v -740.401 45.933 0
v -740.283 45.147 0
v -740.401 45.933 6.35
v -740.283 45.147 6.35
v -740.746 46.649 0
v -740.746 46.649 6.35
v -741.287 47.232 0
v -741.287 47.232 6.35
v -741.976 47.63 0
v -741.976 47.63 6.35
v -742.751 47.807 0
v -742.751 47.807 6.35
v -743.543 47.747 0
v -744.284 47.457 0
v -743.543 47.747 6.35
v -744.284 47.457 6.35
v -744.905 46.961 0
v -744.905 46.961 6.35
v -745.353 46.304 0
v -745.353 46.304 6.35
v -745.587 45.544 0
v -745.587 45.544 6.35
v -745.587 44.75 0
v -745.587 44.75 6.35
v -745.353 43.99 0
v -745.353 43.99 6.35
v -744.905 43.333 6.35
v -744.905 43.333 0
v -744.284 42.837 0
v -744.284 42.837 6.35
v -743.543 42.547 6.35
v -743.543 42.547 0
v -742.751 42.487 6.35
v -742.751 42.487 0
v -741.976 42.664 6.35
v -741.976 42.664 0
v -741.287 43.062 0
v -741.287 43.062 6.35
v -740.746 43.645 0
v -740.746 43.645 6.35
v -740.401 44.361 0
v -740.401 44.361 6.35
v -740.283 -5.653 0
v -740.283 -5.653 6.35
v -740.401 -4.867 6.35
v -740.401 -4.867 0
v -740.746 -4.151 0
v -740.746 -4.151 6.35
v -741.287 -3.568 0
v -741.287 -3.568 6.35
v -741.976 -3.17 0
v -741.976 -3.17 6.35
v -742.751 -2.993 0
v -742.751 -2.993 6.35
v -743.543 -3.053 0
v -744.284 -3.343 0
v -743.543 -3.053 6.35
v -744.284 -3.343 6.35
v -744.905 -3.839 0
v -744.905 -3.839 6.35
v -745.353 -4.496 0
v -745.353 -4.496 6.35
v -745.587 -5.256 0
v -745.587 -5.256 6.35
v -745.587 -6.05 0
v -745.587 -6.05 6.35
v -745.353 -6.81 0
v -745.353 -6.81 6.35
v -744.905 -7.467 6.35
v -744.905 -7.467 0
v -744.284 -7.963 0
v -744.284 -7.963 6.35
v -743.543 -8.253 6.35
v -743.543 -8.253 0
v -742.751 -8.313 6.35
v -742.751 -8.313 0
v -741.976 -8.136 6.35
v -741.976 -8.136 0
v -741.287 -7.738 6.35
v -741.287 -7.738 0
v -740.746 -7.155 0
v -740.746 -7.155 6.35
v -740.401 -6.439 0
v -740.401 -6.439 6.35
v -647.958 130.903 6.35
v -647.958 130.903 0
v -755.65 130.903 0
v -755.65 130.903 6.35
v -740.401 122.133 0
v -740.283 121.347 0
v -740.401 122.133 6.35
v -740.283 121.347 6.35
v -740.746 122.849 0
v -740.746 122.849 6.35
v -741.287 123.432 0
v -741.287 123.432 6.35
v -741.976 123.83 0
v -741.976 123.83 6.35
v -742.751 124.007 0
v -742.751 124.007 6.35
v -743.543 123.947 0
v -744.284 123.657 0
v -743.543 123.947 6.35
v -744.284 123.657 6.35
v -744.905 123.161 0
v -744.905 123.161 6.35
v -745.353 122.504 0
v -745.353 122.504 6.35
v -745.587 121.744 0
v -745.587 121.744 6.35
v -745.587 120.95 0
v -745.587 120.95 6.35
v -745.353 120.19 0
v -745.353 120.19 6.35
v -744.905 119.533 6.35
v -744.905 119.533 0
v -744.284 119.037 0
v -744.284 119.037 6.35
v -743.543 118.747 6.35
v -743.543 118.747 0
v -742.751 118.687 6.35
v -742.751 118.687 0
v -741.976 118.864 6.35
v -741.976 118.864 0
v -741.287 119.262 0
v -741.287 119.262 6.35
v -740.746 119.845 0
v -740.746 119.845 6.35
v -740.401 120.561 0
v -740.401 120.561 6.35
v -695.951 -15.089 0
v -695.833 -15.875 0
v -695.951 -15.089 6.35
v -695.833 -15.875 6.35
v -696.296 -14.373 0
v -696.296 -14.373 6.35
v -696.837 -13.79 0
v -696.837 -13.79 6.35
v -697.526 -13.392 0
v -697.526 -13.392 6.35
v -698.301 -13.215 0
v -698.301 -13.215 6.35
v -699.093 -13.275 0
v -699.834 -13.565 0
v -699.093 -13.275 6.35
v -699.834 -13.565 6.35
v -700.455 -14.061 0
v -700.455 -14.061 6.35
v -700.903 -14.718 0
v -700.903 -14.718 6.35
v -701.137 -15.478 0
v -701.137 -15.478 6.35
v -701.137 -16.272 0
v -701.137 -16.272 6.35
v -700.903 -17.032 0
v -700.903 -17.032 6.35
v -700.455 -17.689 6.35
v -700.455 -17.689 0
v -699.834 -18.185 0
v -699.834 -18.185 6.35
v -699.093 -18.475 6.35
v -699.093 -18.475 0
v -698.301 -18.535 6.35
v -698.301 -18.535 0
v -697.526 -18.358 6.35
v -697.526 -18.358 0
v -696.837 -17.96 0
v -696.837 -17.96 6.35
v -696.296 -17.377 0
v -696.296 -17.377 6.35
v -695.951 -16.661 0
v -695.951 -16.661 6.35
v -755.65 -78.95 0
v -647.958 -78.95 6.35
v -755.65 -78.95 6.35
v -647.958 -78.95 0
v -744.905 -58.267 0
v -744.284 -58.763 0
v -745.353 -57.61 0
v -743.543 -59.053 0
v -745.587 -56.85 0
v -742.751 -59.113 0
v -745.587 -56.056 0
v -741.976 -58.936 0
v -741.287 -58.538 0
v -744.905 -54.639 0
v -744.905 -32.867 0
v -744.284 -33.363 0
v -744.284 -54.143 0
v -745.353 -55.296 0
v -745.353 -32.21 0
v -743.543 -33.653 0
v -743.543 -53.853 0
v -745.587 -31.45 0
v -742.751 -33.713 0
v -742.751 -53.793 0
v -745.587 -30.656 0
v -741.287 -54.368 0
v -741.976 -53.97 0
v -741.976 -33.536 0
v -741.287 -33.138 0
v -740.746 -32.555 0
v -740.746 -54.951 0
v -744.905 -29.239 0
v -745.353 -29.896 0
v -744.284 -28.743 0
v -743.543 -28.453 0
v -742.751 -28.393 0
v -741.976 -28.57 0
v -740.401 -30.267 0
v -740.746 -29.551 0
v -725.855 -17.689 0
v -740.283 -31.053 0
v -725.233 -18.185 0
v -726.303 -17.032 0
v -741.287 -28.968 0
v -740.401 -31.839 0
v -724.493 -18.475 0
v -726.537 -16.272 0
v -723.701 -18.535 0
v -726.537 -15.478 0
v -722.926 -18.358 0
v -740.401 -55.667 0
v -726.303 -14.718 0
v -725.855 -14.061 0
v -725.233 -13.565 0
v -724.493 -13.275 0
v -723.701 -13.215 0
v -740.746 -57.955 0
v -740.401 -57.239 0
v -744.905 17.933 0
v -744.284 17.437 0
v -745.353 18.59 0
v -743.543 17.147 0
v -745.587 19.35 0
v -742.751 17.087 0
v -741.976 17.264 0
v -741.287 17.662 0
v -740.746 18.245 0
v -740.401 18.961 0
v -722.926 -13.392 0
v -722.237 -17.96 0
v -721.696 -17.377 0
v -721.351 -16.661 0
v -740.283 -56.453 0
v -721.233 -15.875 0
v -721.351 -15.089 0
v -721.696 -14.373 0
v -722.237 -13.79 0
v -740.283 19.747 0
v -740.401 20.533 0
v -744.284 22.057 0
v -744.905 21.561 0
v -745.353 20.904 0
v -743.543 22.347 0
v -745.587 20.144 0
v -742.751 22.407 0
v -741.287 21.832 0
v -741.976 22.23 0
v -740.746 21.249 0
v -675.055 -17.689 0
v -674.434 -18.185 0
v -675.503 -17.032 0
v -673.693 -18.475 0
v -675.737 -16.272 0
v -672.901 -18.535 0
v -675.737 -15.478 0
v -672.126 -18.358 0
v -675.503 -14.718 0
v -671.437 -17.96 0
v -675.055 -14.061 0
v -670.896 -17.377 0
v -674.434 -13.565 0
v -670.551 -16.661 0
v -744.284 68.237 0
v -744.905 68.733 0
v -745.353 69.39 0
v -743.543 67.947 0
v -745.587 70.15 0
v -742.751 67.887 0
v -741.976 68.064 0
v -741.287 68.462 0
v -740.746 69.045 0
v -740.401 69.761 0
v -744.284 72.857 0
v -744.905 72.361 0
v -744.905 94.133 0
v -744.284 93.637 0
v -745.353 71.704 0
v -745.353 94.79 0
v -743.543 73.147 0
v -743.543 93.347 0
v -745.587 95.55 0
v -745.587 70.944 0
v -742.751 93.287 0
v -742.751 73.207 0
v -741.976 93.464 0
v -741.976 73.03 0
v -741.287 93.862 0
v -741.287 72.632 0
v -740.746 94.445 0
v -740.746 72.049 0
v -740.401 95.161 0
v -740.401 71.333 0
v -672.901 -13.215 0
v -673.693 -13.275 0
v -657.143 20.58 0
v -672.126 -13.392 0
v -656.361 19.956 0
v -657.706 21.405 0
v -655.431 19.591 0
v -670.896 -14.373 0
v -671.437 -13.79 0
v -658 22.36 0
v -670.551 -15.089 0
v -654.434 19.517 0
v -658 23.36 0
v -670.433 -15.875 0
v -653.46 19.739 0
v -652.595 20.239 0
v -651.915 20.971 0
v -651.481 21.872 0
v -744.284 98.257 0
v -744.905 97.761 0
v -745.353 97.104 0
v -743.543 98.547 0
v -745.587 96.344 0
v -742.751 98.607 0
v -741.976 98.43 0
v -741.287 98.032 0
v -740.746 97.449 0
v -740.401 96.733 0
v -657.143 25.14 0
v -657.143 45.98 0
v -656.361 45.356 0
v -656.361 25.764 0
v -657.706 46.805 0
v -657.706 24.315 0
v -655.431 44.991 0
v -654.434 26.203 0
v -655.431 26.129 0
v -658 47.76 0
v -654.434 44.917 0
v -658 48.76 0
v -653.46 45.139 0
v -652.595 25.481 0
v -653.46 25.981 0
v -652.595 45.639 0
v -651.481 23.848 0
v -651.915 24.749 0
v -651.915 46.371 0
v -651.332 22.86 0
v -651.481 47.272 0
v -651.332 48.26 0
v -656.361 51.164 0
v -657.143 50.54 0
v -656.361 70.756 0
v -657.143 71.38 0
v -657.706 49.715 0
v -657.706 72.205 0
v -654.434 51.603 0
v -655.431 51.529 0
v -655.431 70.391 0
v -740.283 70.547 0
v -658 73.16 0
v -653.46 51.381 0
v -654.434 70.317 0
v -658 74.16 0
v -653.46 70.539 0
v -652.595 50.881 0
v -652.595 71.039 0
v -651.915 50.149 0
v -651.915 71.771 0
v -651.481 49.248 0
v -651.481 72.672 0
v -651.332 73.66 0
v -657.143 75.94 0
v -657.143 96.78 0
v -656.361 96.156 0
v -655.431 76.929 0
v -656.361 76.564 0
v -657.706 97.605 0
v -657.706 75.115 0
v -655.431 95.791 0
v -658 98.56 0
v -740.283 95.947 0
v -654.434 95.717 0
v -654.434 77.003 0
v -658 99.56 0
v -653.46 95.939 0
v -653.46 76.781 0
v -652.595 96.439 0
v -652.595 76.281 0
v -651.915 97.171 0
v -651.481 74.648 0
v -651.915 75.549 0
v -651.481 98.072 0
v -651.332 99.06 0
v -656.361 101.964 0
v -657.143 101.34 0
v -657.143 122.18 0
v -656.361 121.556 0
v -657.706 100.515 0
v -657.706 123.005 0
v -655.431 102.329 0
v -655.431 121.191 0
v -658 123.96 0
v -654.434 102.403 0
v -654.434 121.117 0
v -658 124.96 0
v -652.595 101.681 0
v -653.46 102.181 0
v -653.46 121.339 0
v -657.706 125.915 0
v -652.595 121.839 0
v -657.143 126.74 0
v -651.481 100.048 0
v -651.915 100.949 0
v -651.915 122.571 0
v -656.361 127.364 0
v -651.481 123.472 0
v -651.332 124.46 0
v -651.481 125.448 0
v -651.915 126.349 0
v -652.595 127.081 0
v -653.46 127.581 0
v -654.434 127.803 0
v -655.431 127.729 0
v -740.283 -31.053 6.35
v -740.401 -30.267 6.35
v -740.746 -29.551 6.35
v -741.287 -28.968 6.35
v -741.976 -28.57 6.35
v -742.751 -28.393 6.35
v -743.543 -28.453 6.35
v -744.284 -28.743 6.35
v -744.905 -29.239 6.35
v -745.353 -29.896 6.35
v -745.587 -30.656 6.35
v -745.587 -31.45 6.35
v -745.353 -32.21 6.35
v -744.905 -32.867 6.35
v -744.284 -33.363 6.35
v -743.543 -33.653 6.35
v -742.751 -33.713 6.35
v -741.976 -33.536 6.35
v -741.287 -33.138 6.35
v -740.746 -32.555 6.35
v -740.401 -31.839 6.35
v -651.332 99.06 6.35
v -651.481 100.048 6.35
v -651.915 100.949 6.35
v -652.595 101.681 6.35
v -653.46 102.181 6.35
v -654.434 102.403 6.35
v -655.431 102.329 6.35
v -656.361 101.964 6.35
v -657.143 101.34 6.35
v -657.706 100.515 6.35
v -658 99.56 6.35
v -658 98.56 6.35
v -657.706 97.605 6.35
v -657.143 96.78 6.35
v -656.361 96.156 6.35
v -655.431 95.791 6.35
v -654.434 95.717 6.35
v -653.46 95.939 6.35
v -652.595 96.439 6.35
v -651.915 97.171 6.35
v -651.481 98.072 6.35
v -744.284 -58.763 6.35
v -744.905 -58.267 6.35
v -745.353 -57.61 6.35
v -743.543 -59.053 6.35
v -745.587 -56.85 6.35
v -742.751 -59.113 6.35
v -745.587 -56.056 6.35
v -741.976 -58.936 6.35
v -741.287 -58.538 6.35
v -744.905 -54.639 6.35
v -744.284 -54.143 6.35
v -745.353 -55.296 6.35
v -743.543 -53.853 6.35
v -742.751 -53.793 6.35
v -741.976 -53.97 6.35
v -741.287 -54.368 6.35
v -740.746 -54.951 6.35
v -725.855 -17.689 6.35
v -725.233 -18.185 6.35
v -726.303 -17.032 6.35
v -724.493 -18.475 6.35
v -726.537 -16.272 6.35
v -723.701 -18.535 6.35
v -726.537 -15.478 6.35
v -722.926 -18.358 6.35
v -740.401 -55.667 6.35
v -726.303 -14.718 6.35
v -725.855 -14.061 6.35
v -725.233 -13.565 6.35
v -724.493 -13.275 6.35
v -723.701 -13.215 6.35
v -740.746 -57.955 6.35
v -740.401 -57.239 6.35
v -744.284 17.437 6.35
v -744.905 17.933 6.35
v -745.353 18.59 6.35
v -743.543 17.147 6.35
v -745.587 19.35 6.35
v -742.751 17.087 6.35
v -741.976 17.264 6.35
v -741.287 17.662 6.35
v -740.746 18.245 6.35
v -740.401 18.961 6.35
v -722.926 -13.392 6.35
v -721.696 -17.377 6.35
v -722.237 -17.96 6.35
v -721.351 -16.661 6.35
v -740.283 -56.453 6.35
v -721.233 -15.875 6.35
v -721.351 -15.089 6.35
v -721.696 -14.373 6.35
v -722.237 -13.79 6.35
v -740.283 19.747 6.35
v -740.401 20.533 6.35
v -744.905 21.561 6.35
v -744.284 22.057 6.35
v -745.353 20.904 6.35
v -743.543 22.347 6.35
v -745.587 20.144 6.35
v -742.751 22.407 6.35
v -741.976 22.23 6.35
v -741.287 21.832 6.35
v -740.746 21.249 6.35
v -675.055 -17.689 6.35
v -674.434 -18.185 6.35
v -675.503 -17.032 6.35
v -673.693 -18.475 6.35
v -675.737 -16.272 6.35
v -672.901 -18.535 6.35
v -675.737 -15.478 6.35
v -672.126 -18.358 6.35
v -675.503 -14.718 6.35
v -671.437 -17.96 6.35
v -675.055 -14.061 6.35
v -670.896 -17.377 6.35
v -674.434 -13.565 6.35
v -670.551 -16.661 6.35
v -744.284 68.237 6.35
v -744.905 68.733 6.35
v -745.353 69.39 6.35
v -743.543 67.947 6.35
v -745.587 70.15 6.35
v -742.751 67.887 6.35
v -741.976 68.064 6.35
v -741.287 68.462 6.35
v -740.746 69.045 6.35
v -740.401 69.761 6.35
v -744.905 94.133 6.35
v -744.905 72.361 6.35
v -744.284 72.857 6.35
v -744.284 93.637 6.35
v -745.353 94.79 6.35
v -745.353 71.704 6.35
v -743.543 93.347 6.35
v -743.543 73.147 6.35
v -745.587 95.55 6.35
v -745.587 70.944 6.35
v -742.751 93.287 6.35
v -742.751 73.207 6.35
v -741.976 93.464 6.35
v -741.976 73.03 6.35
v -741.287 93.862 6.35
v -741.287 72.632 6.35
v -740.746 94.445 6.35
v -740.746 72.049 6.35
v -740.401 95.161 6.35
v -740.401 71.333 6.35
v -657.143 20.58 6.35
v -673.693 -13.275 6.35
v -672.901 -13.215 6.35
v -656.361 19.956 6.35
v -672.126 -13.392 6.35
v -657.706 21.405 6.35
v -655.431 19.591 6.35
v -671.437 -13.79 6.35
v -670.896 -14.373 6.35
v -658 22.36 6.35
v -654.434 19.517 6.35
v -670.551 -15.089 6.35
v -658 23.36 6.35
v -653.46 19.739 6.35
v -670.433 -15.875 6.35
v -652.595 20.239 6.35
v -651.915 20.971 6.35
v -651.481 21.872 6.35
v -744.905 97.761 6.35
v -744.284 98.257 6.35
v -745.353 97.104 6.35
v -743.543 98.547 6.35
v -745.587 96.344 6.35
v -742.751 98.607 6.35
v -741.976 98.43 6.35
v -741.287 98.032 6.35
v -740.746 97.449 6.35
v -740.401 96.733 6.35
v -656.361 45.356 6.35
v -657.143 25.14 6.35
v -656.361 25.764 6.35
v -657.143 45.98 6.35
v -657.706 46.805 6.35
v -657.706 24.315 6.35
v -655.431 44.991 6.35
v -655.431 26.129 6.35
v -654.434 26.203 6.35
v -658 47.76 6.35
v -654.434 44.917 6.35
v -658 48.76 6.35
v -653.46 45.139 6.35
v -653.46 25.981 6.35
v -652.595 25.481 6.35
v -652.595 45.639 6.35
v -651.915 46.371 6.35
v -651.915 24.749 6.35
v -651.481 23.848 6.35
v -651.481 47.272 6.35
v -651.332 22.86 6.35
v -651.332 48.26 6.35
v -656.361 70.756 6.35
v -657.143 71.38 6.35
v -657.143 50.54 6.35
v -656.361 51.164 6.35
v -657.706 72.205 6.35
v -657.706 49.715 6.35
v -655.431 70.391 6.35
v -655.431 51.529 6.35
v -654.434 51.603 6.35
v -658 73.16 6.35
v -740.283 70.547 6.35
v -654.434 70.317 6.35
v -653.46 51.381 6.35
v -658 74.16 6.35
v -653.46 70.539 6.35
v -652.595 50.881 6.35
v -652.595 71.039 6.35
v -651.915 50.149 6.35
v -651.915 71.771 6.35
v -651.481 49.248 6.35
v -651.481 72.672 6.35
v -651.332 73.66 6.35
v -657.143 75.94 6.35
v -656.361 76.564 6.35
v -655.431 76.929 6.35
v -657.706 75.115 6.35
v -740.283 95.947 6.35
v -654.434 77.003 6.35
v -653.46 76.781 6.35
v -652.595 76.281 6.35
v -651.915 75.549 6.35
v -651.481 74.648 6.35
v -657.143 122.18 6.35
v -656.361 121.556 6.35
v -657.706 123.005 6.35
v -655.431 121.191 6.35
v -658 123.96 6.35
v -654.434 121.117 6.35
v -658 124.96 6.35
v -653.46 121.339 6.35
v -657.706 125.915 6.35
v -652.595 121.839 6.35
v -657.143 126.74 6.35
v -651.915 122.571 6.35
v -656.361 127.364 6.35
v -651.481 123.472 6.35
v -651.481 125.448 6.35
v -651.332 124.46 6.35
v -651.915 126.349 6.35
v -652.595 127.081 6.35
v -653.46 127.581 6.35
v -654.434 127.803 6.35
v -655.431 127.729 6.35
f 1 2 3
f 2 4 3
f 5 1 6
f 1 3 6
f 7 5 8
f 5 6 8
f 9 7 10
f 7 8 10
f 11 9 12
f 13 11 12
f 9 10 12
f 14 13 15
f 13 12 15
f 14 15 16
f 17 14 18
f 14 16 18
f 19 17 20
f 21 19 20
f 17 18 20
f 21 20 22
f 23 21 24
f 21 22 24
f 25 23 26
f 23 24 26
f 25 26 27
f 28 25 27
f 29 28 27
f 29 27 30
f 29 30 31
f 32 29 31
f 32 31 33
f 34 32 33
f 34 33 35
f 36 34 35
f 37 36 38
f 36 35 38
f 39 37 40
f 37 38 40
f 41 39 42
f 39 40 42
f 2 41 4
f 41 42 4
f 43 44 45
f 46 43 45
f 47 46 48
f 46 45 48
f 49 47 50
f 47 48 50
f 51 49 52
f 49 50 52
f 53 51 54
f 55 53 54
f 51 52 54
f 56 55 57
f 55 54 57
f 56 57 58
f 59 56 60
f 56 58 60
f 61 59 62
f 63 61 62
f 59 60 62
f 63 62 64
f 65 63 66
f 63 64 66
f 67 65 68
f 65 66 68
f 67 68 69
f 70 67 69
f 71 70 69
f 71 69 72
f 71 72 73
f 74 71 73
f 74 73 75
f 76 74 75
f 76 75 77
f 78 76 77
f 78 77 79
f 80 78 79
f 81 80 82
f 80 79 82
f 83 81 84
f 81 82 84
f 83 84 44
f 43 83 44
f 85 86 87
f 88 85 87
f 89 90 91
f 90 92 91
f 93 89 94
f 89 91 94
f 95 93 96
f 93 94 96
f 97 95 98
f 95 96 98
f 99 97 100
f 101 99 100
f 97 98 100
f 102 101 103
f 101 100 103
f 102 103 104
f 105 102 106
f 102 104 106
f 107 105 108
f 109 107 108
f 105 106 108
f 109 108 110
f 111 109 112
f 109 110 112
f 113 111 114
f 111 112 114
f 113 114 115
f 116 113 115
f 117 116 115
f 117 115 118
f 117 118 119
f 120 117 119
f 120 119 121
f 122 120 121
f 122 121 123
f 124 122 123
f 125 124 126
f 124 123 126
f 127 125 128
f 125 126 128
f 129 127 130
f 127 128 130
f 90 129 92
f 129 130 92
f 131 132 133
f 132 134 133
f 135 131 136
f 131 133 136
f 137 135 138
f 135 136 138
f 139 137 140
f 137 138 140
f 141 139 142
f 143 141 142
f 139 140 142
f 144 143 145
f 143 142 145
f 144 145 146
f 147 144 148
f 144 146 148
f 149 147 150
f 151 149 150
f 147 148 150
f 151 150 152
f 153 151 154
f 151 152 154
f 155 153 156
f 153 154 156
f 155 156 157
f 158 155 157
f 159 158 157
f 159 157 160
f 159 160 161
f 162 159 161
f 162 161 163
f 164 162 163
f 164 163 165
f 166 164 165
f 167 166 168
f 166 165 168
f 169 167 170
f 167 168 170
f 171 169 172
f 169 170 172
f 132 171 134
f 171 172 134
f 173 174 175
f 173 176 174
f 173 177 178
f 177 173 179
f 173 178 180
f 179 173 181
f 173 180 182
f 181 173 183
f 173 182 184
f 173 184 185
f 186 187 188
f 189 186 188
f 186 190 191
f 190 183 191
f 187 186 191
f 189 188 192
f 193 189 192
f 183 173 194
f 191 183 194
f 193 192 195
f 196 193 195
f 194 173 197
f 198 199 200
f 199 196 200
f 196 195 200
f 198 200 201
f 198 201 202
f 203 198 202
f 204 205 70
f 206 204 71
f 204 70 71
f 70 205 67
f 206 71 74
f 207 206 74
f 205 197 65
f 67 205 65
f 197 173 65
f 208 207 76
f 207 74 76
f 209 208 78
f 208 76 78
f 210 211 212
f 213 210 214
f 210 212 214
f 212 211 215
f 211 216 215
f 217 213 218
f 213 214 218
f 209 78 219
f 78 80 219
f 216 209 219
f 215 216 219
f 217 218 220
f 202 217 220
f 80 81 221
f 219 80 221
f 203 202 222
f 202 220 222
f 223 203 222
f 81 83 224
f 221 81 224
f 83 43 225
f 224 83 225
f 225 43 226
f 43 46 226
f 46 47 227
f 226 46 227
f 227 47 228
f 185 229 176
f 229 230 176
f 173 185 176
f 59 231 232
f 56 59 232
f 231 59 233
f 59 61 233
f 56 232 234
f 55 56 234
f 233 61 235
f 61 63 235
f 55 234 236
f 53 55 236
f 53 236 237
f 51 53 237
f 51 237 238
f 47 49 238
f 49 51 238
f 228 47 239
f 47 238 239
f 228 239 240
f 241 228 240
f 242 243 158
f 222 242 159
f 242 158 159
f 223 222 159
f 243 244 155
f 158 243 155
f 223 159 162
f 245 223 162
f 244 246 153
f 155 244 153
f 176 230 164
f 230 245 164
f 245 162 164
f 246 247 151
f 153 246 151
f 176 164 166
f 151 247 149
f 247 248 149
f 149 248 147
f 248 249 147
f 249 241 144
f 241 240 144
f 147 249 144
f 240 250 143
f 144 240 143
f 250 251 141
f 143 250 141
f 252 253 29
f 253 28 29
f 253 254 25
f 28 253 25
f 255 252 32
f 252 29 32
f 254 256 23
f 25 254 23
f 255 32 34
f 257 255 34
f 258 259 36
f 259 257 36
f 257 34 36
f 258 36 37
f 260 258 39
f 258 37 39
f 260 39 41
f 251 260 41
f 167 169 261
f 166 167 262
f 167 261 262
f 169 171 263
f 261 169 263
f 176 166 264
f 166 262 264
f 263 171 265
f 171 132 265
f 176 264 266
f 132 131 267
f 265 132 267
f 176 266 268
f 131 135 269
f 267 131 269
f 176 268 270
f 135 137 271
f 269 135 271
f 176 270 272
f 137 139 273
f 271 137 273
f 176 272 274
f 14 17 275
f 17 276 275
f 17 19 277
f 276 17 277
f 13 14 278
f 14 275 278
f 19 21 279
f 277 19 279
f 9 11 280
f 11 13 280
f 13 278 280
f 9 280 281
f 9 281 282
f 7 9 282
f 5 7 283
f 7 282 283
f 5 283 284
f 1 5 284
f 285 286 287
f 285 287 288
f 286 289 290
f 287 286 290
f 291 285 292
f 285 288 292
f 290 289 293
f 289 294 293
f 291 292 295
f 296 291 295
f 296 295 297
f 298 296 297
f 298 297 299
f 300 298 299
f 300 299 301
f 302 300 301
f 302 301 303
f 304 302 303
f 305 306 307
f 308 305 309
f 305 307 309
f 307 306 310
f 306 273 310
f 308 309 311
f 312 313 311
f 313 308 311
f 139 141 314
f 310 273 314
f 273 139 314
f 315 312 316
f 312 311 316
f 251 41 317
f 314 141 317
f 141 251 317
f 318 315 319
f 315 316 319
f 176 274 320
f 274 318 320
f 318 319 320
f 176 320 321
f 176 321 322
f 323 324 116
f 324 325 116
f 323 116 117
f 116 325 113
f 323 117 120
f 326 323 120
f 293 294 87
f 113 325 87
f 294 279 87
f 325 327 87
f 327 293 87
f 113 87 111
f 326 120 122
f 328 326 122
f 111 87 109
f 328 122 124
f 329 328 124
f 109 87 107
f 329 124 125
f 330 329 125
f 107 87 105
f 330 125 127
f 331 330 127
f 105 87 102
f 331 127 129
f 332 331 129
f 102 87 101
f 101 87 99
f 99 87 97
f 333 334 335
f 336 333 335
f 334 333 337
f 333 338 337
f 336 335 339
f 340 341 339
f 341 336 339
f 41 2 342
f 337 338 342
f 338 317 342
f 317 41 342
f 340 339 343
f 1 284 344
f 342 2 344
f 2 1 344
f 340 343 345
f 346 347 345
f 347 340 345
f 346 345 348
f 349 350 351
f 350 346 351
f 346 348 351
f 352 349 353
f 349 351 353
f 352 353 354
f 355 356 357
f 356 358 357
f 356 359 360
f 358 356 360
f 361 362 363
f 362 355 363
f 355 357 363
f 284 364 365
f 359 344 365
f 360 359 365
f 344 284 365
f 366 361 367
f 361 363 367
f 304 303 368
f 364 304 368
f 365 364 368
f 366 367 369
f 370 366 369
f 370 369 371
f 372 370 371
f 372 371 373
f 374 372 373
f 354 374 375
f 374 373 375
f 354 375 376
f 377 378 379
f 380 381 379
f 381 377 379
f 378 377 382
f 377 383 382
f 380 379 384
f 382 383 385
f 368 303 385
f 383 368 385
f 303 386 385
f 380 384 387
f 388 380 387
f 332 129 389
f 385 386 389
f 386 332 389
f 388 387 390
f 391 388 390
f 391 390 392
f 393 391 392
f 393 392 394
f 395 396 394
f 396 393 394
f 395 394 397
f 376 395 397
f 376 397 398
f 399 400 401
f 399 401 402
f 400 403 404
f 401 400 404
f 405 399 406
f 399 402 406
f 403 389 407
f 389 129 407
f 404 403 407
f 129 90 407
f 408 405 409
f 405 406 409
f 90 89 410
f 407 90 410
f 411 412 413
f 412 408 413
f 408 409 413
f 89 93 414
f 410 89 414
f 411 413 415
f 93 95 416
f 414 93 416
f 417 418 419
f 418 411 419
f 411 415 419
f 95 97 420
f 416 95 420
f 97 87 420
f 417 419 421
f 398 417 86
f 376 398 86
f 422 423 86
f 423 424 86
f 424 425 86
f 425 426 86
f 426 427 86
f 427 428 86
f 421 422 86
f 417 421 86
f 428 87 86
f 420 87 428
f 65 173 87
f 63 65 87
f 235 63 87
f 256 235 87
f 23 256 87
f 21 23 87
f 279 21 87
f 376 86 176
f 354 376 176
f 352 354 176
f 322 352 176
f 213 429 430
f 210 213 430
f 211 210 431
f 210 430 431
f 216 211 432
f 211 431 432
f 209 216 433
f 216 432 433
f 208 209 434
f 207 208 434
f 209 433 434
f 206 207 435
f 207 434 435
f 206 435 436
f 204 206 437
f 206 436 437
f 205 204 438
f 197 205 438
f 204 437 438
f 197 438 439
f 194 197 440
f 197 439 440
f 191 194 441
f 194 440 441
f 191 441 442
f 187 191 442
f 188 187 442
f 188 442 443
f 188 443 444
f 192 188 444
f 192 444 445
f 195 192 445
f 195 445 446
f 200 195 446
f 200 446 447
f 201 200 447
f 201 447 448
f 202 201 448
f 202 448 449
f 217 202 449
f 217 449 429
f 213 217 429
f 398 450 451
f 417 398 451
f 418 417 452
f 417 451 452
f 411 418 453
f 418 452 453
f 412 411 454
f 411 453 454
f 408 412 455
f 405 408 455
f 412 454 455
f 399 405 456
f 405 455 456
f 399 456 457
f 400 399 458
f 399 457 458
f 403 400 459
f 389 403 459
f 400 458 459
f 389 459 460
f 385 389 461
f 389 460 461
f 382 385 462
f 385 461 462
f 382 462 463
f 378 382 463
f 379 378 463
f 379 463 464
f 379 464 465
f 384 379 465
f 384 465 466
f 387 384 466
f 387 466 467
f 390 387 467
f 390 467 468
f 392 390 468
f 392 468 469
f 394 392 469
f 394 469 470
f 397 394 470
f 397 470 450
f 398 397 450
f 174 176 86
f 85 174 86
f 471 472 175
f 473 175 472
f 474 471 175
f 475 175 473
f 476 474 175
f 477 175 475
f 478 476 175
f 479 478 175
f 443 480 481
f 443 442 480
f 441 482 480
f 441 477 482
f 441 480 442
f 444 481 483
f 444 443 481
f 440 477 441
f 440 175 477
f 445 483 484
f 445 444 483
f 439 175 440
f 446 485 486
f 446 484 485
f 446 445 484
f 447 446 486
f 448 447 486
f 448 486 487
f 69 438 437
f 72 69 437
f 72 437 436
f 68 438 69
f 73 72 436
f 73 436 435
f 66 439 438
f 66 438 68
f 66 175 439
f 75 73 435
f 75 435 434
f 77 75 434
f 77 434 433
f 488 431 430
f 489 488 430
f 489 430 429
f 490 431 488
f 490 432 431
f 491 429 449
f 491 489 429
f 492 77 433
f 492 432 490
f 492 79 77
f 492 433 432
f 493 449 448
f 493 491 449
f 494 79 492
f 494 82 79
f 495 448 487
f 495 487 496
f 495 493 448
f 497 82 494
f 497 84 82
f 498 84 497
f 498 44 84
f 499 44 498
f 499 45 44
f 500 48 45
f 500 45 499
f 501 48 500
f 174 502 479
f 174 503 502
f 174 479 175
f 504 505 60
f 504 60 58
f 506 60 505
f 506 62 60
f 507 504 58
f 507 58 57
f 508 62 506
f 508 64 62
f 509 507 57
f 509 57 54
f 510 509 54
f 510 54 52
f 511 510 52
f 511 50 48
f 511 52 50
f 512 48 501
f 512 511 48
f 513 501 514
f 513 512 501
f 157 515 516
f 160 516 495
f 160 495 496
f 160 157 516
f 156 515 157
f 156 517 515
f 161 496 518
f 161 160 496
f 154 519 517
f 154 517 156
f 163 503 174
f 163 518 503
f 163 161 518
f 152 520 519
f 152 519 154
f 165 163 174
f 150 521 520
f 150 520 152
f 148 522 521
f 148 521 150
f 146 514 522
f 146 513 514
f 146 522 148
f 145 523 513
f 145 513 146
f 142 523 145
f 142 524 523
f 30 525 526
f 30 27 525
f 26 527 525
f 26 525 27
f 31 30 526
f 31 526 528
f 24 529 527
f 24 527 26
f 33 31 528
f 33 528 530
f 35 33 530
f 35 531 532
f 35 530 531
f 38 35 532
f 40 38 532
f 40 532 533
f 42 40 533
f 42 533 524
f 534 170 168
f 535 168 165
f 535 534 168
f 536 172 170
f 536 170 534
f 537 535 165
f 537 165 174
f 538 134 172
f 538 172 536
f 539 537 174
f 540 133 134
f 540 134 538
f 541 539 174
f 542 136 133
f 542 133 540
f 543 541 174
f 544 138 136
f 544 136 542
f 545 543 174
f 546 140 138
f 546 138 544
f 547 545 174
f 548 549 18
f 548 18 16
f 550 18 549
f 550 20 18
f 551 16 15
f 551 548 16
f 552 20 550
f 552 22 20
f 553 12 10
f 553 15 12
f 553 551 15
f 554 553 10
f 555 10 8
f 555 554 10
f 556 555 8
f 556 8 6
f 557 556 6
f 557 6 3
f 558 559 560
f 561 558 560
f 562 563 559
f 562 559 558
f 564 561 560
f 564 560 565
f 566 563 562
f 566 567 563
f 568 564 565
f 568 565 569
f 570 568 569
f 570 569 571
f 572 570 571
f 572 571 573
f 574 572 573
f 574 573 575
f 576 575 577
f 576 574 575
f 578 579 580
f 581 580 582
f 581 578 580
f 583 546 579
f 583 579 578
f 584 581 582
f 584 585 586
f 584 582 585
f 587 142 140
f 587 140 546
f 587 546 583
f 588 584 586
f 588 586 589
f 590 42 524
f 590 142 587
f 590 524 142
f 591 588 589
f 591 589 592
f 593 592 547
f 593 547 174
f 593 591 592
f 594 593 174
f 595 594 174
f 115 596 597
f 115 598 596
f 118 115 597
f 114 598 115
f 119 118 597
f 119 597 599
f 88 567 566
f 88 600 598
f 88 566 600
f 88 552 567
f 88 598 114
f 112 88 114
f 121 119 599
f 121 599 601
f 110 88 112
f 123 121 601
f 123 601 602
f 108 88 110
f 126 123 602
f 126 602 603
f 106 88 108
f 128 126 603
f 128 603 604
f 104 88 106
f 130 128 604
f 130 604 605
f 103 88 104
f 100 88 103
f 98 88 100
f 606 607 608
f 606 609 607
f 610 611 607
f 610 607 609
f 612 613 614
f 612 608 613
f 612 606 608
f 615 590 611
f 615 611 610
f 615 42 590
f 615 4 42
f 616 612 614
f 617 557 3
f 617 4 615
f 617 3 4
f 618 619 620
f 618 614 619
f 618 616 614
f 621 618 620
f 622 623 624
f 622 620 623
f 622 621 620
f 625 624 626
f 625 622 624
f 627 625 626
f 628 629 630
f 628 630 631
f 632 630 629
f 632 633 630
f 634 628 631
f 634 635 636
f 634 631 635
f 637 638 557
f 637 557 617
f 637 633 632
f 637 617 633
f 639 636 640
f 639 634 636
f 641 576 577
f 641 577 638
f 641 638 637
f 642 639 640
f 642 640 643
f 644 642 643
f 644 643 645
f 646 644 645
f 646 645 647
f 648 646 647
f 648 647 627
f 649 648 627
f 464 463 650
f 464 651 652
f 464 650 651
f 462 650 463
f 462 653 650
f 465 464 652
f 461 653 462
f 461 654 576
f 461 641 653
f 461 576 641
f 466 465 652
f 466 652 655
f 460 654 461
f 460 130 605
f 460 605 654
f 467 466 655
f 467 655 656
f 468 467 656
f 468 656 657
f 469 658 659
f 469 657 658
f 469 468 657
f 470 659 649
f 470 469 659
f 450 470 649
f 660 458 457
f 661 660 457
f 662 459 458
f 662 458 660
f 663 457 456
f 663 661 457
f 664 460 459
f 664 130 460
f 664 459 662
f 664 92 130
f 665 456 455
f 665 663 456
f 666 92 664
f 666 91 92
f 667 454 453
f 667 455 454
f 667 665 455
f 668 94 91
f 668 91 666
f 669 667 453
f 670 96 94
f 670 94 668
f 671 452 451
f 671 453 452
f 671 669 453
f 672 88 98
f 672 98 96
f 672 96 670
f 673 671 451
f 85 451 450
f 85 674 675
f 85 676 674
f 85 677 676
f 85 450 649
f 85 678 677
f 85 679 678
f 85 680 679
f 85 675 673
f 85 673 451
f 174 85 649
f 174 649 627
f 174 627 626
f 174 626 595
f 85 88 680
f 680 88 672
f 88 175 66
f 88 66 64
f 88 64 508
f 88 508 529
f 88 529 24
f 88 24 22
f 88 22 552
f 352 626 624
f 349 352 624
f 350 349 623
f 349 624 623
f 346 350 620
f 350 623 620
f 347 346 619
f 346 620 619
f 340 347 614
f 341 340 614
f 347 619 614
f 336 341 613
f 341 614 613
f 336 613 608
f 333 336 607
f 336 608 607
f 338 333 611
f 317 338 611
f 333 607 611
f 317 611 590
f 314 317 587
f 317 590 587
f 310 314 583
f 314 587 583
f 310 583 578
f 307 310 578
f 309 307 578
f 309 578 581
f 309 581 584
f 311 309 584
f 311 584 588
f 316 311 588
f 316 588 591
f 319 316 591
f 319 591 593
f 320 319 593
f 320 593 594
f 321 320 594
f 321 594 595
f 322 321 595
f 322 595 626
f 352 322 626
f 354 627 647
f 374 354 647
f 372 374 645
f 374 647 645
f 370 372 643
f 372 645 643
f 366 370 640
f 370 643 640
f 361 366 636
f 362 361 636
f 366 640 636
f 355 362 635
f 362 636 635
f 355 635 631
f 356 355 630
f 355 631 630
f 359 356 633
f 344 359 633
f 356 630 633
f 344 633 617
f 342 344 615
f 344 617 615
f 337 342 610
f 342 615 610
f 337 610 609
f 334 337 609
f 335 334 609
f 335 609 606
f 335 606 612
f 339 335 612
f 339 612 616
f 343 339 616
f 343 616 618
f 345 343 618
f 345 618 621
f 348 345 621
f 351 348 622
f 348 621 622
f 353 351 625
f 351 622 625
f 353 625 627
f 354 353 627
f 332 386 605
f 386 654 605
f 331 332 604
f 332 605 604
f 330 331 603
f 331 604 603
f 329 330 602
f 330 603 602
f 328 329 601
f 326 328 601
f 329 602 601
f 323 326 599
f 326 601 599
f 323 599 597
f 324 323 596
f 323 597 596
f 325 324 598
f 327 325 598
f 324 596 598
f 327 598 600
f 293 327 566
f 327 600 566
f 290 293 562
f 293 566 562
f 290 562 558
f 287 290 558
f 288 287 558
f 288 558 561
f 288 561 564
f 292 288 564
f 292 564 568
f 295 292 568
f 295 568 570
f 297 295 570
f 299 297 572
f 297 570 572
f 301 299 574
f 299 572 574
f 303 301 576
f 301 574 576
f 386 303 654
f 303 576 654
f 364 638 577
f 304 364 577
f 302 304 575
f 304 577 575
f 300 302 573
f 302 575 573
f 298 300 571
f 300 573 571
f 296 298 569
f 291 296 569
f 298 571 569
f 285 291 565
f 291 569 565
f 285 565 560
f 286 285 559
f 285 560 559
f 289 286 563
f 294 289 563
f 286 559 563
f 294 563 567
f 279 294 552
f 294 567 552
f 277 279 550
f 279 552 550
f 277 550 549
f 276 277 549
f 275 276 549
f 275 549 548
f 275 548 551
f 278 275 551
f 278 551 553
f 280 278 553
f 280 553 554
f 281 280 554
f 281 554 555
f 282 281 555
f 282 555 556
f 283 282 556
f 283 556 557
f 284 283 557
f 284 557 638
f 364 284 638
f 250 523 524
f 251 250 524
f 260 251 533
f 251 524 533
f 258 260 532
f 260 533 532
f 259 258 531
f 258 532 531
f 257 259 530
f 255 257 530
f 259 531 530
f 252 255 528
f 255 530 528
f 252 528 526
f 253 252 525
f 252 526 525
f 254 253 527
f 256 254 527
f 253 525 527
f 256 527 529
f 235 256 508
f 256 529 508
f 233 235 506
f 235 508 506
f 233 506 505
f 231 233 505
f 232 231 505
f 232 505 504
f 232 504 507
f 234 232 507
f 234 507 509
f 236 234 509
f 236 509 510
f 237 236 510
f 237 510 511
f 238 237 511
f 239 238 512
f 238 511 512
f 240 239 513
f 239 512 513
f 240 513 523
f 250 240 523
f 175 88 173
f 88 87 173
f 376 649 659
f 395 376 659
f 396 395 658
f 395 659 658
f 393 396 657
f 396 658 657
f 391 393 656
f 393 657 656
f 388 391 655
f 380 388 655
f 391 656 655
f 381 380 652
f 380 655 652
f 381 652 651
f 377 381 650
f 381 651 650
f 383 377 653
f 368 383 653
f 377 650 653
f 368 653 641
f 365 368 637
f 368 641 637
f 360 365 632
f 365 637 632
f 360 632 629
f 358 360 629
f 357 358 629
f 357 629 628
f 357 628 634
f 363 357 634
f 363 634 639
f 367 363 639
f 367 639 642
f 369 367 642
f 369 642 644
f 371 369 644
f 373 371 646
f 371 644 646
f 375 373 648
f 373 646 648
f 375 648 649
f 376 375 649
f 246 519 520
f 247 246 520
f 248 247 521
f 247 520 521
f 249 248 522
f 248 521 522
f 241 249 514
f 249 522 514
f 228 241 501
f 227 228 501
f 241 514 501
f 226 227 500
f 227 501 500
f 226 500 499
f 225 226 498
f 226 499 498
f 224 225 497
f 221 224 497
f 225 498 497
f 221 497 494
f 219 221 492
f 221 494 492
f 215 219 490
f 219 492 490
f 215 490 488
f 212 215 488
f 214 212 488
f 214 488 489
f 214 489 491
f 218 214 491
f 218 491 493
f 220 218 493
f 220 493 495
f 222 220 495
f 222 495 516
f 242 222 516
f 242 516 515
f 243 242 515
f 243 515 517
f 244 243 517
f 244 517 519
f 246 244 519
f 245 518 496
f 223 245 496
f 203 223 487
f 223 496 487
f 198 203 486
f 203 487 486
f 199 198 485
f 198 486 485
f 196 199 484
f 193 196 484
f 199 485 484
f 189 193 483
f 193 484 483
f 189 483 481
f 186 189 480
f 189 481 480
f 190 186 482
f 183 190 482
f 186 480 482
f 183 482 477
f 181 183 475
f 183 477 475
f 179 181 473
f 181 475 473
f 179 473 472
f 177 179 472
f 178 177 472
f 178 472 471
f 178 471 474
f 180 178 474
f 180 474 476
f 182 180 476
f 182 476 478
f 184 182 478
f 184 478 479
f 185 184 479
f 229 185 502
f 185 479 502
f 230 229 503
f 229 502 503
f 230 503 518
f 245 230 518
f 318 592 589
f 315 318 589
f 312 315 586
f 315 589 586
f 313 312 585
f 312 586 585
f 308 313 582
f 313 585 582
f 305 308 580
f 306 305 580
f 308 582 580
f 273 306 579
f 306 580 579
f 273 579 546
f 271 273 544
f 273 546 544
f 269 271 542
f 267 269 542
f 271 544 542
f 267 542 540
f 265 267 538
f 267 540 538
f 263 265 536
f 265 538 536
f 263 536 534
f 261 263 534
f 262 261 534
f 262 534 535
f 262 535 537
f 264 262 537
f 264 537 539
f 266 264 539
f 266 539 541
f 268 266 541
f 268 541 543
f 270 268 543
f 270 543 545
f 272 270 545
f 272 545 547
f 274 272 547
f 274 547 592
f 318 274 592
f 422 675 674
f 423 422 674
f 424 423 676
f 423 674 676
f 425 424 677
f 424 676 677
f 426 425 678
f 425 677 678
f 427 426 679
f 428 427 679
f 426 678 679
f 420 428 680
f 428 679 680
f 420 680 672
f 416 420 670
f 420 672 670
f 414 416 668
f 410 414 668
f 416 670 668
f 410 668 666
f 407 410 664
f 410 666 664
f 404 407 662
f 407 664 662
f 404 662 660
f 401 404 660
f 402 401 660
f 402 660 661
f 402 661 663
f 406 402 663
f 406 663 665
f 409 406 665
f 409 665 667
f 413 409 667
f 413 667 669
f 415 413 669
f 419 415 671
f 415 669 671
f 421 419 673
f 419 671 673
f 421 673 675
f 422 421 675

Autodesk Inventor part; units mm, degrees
ref_plane "YZ Plane" through (0, 0, 0) normal (1, 0, 0) x (0, 1, 0)
ref_plane "XZ Plane" through (0, 0, 0) normal (0, 1, 0) x (-1, 0, 0)
ref_plane "XY Plane" through (0, 0, 0) normal (0, 0, 1) x (1, 0, 0)
ref_plane "Work Plane3" through (0, 0, 0) normal (0, 0, 1) x (1, 0, 0)
sketch "Sketch1" plane through (0, 0, 0) normal (0, 0, 1) x (1, 0, 0)
  line L0 (-755.65, -71.0123) -> (-755.65, -75.0128) projected
  line L1 (-57.15, -75.0128) -> (-755.65, -75.0128) projected
  line L2 (-57.15, -75.0128) -> (-57.15, -71.0123) projected
  line L3 (-57.15, -71.0123) -> (-755.65, -71.0123) projected
  line L4 (-57.15, -78.9498) -> (-755.65, -78.9498) projected
  line L5 (-755.65, -78.9498) -> (-647.9579, -78.9498)
  line L6 (-647.9579, -78.9498) -> (-647.9579, 130.9029)
  line L7 (-647.9579, 130.9029) -> (-755.65, 130.9029)
  line L8 (-755.65, 130.9029) -> (-755.65, -78.9498)
  point P0 (0, 0)
extrude "Extrusion1" add sketch "Sketch1" along normal blind 6.35 contours L3 L6 L1 L0 | L8 L7 L6 L3 | L1 L6 L4 L8
sketch "Sketch3" plane through (0, 0, 6.35) normal (0, 0, 1) x (1, 0, 0)
  point P0 (0, 0)
sketch "Sketch4" plane through (0, 0, 6.35) normal (0, 0, 1) x (1, 0, 0)
  circle A0 centre (-654.685, 22.86) radius 3.3528 projected
  circle A1 centre (-654.685, 48.26) radius 3.3528 projected
  circle A2 centre (-654.685, 73.66) radius 3.3528 projected
  circle A3 centre (-654.685, 99.06) radius 3.3528 projected
  circle A4 centre (-654.685, 124.46) radius 3.3528 projected
  line L0 (-663.448, 15.875) -> (-648.335, 15.875) construction
  line L1 (-648.335, 133.985) -> (-648.335, 15.875) construction
  line L2 (-648.335, 133.985) -> (-651.51, 137.16) construction
  line L3 (-663.448, 137.16) -> (-651.51, 137.16) construction
  line L4 (-663.448, 137.16) -> (-663.448, 15.875) construction
  line L5 (-663.448, 137.16) -> (-663.448, 15.875) projected
  point P0 (0, 0)
extrude "Extrusion2" cut sketch "Sketch4" against normal blind 6.35
sketch "Sketch5" plane through (0, 0, 6.35) normal (0, 0, 1) x (1, 0, 0)
  line L0 (-736.6, -3.937) -> (-736.6, -22.225) projected
  line L1 (-460.375, -22.225) -> (-736.6, -22.225) projected
  line L2 (-460.375, -22.225) -> (-457.2, -19.05) projected
  line L3 (-457.2, -3.937) -> (-457.2, -19.05) projected
  line L4 (-736.6, -3.937) -> (-457.2, -3.937) projected
  circle A0 centre (-469.9, -15.875) radius 2.667 projected
  circle A1 centre (-495.3, -15.875) radius 2.667 projected
  circle A2 centre (-520.7, -15.875) radius 2.667 projected
  circle A3 centre (-546.1, -15.875) radius 2.667 projected
  circle A4 centre (-571.5, -15.875) radius 2.667 projected
  circle A5 centre (-596.9, -15.875) radius 2.667 projected
  circle A6 centre (-622.3, -15.875) radius 2.667 projected
  circle A7 centre (-647.7, -15.875) radius 2.667 projected
  circle A8 centre (-673.1, -15.875) radius 2.667 projected
  circle A9 centre (-698.5, -15.875) radius 2.667 projected
  circle A10 centre (-723.9, -15.875) radius 2.667 projected
  circle A11 centre (-742.95, 476.947) radius 2.667 projected
  circle A12 centre (-742.95, 451.547) radius 2.667 projected
  circle A13 centre (-742.95, 426.147) radius 2.667 projected
  circle A14 centre (-742.95, 400.747) radius 2.667 projected
  circle A15 centre (-742.95, 375.347) radius 2.667 projected
  circle A16 centre (-742.95, 349.947) radius 2.667 projected
  circle A17 centre (-742.95, 324.547) radius 2.667 projected
  circle A18 centre (-742.95, 299.147) radius 2.667 projected
  circle A19 centre (-742.95, 273.747) radius 2.667 projected
  circle A20 centre (-742.95, 248.347) radius 2.667 projected
  circle A21 centre (-742.95, 222.947) radius 2.667 projected
  circle A22 centre (-742.95, 197.547) radius 2.667 projected
  circle A23 centre (-742.95, 172.147) radius 2.667 projected
  circle A24 centre (-742.95, 146.747) radius 2.667 projected
  circle A25 centre (-742.95, 121.347) radius 2.667 projected
  circle A26 centre (-742.95, 95.947) radius 2.667 projected
  circle A27 centre (-742.95, 70.547) radius 2.667 projected
  circle A28 centre (-742.95, 45.147) radius 2.667 projected
  circle A29 centre (-742.95, 19.747) radius 2.667 projected
  circle A30 centre (-742.95, -5.653) radius 2.667 projected
  circle A31 centre (-742.95, -31.053) radius 2.667 projected
  circle A32 centre (-742.95, -56.453) radius 2.667 projected
  line L5 (-736.6, 496.0909) -> (-751.713, 496.0909) projected
  line L6 (-751.713, -75.5081) -> (-751.713, 496.0909) projected
  line L7 (-751.713, -75.5081) -> (-736.6, -75.5081) projected
  line L8 (-736.6, 496.0909) -> (-736.6, -75.5081) projected
  point P0 (0, 0)
extrude "Extrusion3" cut sketch "Sketch5" against normal blind 6.35 contours A8 | A9 | A10 | A25 | A26 | A27 | A28 | A29 | A30 | A31 | A32
properties part number "Aluminum Mounting Plate"
